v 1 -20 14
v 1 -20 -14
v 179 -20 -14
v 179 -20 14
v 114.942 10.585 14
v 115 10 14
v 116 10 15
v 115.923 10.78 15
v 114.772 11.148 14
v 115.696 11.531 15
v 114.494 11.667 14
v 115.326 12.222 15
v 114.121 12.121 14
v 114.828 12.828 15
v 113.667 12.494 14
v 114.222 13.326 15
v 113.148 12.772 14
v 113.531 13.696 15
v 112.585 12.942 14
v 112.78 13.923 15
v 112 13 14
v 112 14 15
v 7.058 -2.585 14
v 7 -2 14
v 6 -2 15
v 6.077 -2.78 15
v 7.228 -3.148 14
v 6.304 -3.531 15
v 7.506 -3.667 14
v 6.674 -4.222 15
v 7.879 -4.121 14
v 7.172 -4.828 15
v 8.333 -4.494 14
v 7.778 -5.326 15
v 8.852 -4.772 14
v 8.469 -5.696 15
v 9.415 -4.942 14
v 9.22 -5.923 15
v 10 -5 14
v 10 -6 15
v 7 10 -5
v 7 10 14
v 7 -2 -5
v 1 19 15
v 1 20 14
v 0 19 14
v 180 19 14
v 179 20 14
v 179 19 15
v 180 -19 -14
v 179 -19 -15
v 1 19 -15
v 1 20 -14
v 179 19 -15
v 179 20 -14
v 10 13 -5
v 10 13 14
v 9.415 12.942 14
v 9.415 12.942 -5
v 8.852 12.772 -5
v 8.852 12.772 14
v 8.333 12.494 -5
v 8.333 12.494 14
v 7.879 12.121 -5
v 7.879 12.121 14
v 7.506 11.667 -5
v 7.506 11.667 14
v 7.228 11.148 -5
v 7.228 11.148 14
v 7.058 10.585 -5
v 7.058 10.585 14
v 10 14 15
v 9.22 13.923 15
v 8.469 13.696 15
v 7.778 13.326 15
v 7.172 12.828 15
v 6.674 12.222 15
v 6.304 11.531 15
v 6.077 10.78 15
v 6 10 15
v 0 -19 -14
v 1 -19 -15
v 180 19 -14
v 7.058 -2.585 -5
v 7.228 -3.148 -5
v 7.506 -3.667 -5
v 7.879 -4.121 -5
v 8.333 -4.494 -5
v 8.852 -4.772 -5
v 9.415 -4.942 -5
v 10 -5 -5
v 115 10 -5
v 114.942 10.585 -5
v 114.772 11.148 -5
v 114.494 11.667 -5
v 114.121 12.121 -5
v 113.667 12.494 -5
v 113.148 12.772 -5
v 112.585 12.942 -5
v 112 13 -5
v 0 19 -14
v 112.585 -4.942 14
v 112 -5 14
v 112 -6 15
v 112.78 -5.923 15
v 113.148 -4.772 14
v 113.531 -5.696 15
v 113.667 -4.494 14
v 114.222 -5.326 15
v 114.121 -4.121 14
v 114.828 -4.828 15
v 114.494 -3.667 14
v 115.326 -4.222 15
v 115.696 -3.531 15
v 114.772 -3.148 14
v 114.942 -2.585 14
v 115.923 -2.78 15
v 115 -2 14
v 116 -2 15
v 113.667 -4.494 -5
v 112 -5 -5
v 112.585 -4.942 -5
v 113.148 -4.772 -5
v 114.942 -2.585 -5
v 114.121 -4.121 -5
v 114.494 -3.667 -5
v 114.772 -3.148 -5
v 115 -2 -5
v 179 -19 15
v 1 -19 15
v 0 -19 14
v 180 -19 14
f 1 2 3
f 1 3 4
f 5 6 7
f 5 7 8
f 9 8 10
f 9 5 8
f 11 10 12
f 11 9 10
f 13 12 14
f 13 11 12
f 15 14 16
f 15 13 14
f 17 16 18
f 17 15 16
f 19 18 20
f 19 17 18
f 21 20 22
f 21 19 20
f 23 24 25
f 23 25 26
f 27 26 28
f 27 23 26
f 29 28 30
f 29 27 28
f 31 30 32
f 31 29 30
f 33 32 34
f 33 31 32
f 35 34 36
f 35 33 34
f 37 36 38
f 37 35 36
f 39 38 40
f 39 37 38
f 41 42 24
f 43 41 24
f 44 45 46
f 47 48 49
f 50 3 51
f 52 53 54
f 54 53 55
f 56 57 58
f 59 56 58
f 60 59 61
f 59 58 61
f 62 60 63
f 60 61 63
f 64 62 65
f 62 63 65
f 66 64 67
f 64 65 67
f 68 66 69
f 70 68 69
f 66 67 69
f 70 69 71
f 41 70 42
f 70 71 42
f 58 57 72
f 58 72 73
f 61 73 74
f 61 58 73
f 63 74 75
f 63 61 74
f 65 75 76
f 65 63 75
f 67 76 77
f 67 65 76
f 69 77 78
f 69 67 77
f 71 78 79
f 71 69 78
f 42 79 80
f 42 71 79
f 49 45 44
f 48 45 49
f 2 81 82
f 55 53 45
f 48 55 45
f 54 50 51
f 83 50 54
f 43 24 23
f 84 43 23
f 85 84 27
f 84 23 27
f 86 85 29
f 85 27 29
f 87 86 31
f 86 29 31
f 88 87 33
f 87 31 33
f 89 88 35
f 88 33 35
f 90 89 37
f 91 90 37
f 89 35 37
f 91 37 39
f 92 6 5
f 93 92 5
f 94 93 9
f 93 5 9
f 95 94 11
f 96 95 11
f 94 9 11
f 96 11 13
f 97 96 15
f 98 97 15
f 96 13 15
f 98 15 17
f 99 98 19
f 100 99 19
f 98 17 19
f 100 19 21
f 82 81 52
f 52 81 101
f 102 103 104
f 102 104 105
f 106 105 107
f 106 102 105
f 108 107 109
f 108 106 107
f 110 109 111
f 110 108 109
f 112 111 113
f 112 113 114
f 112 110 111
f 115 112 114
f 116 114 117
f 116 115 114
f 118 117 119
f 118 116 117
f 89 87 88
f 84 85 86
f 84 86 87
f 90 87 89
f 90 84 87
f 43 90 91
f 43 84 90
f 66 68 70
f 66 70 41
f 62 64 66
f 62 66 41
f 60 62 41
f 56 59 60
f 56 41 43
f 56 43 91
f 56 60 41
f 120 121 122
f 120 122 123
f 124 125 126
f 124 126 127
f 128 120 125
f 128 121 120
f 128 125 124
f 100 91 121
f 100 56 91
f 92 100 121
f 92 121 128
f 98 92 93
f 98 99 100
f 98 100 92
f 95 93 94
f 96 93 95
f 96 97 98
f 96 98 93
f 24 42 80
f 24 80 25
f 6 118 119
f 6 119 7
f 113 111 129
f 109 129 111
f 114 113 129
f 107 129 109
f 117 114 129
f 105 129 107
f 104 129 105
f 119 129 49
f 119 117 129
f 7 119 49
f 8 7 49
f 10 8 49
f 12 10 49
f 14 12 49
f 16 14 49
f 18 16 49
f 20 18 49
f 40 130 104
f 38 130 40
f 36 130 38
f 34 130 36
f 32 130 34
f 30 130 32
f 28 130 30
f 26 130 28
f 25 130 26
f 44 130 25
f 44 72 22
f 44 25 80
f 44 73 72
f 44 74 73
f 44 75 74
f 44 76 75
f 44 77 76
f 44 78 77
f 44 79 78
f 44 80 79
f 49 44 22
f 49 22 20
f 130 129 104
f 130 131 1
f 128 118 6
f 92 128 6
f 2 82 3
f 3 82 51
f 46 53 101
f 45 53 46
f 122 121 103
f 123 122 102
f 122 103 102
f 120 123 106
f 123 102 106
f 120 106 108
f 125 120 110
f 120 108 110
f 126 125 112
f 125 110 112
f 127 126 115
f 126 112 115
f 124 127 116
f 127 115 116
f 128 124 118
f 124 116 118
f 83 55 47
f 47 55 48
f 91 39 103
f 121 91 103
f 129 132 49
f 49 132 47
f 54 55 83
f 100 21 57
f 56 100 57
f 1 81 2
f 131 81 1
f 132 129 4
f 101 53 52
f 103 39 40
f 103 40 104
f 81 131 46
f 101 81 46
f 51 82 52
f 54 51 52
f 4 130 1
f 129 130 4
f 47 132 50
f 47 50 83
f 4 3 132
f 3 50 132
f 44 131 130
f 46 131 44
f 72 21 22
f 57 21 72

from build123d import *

# Parameters (mm, degrees)
F0_W     = 40
F0_H     = 30
F1_DEPTH = 180
F3_DEPTH = 20
F4_SIZE  = 1


with BuildPart() as f1:
    # F0 (on Right) → F1 (new body)
    with BuildSketch(Plane.YZ):
        Rectangle(F0_W, F0_H)
    extrude(amount=F1_DEPTH)

    # F2 (on face) → F3 (cut)
    with BuildSketch(Plane.XY.offset(15)):
        with BuildLine():
            Line((10, -5), (112, -5))
            ThreePointArc((112, -5), (114.1213203436, -4.1213203436), (115, -2))
            Line((115, -2), (115, 10))
            ThreePointArc((115, 10), (114.1213203436, 12.1213203436), (112, 13))
            Line((112, 13), (10, 13))
            ThreePointArc((10, 13), (7.8786796564, 12.1213203436), (7, 10))
            Line((7, 10), (7, -2))
            ThreePointArc((7, -2), (7.8786796564, -4.1213203436), (10, -5))
        make_face()
    extrude(amount=-F3_DEPTH, mode=Mode.SUBTRACT)

    # F4
    f4_edges = [f1.edges().sort_by_distance(p)[0] for p in [
        (90, 20, -15),
        (90, 20, 15),
        (0, 20, 0),
        (180, 20, 0),
        (0, 0, 15),
        (0, -20, 0),
        (0, 0, -15),
        (90, -20, 15),
        (180, 0, 15),
        (61, 13, 15),
        (115, 4, 15),
        (180, -20, 0),
        (90, -20, -15),
        (7.87868, 12.12132, 15),
        (114.12132, 12.12132, 15),
        (114.12132, -4.12132, 15),
        (61, -5, 15),
        (7.87868, -4.12132, 15),
        (7, 4, 15),
        (180, 0, -15),
    ]]
    chamfer(f4_edges, length=F4_SIZE)


solid = f1.part
